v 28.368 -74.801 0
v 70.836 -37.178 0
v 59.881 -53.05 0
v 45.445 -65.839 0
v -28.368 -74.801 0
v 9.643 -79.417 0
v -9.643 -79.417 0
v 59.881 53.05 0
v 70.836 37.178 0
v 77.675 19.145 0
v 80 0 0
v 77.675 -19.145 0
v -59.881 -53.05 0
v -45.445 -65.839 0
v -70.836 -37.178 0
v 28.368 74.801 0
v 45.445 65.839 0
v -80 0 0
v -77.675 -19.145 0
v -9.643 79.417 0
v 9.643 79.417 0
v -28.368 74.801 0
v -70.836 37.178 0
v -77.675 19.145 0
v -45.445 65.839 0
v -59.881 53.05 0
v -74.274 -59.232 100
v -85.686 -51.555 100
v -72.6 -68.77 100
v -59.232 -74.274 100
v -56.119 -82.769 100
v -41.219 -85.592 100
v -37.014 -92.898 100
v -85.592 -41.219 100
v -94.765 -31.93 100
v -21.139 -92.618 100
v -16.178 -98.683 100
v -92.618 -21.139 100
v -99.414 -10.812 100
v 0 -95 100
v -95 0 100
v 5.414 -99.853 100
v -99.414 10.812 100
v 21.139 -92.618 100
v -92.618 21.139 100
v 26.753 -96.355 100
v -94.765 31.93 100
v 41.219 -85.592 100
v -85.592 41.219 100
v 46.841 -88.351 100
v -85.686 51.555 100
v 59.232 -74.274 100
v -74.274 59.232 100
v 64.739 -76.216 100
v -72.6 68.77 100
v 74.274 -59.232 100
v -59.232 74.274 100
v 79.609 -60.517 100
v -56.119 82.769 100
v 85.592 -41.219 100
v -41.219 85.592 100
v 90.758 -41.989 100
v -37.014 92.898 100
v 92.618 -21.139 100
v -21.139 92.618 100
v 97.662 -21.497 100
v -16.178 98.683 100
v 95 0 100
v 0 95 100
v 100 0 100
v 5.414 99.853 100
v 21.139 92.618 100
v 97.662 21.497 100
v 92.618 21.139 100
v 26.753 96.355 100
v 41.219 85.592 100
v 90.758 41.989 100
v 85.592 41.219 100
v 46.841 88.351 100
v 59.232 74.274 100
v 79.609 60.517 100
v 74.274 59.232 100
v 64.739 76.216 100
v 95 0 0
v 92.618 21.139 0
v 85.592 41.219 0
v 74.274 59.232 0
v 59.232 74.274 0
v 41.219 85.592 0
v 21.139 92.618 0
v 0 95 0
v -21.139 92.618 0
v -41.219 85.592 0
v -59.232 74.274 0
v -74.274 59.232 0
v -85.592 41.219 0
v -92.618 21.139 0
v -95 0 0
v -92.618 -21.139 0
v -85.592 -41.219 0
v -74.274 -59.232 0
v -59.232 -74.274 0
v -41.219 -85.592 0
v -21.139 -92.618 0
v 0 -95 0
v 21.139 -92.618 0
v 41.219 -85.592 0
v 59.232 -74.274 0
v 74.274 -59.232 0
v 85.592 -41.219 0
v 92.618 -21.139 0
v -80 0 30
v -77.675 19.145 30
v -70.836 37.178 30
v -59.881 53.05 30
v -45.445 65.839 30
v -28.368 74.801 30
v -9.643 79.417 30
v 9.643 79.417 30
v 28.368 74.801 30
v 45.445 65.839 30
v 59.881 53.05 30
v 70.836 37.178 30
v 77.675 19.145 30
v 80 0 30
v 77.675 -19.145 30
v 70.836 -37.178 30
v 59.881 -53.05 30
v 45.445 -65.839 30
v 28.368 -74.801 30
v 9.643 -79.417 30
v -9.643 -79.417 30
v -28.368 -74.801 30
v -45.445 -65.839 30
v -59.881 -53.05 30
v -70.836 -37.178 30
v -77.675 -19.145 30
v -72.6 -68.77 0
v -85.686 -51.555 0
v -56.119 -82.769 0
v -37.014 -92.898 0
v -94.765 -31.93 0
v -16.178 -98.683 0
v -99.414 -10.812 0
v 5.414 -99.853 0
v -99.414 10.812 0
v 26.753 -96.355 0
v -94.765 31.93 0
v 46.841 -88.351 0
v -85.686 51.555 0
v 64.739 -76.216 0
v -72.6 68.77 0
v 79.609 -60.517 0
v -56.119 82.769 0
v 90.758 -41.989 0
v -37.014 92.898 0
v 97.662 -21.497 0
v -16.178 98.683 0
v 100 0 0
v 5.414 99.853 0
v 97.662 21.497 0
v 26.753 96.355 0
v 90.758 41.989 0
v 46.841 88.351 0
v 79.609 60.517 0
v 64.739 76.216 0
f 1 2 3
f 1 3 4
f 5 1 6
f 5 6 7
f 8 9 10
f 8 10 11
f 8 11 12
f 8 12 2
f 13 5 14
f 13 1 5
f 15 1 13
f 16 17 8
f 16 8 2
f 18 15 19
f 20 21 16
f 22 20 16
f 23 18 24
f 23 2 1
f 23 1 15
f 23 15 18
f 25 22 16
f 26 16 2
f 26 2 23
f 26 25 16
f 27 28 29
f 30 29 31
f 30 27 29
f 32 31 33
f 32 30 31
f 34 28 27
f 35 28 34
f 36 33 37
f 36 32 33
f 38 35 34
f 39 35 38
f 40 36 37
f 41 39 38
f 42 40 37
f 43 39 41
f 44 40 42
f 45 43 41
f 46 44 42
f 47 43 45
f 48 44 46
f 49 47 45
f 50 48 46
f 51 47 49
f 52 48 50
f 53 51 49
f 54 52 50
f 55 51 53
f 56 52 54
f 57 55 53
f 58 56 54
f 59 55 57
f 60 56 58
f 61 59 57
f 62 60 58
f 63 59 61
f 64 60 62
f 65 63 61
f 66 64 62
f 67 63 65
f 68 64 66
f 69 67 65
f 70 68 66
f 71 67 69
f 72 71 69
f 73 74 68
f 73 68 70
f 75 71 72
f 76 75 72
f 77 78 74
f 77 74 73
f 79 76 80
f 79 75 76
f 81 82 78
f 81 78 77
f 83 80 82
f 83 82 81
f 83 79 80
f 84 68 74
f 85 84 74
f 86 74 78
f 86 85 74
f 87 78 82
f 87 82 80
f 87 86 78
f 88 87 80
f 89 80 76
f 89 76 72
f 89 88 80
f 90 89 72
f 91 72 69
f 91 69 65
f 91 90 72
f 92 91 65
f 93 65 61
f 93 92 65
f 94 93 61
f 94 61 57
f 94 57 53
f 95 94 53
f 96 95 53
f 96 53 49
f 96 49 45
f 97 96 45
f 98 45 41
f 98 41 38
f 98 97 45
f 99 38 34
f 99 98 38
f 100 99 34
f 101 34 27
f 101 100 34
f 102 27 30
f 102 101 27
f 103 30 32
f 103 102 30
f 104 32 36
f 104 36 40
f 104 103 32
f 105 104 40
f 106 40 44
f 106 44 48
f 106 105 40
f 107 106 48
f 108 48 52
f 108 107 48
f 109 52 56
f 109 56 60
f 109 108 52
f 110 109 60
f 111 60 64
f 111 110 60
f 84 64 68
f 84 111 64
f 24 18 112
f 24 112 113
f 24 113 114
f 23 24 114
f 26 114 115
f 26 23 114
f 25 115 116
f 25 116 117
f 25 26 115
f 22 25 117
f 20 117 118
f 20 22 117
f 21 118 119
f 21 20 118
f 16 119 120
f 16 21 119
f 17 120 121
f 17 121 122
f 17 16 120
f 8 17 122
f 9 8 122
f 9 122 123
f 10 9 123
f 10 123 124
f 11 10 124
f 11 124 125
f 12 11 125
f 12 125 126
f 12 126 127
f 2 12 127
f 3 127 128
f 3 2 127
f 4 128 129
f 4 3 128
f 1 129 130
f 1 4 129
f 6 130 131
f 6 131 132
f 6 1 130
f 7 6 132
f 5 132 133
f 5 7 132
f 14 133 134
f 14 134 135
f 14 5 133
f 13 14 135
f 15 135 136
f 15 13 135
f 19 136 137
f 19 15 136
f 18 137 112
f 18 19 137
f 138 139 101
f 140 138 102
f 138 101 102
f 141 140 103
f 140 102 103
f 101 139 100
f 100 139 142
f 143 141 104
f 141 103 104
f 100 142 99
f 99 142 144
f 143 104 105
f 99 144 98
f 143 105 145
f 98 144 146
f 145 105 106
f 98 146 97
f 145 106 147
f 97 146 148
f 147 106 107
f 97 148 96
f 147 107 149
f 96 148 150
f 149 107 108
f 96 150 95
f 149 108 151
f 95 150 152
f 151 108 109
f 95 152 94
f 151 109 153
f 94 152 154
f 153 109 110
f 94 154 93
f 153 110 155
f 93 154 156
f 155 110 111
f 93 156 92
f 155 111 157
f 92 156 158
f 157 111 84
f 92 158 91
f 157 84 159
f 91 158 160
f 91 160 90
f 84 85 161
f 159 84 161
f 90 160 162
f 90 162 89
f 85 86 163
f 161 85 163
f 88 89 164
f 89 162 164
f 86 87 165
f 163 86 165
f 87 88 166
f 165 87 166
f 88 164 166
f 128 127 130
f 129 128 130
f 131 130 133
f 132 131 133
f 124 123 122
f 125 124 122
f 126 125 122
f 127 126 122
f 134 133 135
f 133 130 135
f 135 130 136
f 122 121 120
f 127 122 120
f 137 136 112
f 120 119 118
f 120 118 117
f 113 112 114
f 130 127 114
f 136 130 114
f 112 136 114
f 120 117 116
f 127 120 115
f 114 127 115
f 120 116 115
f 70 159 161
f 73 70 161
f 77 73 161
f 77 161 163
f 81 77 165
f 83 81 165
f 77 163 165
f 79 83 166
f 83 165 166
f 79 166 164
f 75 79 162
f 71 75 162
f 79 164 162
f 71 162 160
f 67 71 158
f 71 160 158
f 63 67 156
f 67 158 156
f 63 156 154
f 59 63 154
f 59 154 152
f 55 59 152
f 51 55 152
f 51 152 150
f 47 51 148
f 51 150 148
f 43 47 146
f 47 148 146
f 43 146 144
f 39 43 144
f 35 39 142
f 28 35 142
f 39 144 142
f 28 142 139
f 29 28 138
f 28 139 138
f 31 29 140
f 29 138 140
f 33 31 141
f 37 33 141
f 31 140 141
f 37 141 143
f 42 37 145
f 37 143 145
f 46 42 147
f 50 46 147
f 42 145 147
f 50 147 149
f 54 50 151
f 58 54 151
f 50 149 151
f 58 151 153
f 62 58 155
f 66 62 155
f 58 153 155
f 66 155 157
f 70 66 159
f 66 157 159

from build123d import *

# Parameters (mm, degrees)
SKETCH_11_R     = 100
SKETCH_11_R_2   = 95
EXTRUDE_4_DEPTH = 100
SKETCH_12_R     = 80
EXTRUDE_5_DEPTH = 30


with BuildPart() as part:
    # 草图11 → 凸台-拉伸4 (new body)
    with BuildSketch(Plane.XY):
        Circle(SKETCH_11_R)
        Circle(SKETCH_11_R_2, mode=Mode.SUBTRACT)
    extrude(amount=EXTRUDE_4_DEPTH)


with BuildPart() as body_2:
    # 草图12 → 凸台-拉伸5 (new body)
    with BuildSketch(Plane(origin=(0, 0, 0), x_dir=(-1, 0, 0), z_dir=(0, 0, -1))):
        Circle(SKETCH_12_R)
    extrude(amount=-EXTRUDE_5_DEPTH)


solid = Compound([part.part, body_2.part])
